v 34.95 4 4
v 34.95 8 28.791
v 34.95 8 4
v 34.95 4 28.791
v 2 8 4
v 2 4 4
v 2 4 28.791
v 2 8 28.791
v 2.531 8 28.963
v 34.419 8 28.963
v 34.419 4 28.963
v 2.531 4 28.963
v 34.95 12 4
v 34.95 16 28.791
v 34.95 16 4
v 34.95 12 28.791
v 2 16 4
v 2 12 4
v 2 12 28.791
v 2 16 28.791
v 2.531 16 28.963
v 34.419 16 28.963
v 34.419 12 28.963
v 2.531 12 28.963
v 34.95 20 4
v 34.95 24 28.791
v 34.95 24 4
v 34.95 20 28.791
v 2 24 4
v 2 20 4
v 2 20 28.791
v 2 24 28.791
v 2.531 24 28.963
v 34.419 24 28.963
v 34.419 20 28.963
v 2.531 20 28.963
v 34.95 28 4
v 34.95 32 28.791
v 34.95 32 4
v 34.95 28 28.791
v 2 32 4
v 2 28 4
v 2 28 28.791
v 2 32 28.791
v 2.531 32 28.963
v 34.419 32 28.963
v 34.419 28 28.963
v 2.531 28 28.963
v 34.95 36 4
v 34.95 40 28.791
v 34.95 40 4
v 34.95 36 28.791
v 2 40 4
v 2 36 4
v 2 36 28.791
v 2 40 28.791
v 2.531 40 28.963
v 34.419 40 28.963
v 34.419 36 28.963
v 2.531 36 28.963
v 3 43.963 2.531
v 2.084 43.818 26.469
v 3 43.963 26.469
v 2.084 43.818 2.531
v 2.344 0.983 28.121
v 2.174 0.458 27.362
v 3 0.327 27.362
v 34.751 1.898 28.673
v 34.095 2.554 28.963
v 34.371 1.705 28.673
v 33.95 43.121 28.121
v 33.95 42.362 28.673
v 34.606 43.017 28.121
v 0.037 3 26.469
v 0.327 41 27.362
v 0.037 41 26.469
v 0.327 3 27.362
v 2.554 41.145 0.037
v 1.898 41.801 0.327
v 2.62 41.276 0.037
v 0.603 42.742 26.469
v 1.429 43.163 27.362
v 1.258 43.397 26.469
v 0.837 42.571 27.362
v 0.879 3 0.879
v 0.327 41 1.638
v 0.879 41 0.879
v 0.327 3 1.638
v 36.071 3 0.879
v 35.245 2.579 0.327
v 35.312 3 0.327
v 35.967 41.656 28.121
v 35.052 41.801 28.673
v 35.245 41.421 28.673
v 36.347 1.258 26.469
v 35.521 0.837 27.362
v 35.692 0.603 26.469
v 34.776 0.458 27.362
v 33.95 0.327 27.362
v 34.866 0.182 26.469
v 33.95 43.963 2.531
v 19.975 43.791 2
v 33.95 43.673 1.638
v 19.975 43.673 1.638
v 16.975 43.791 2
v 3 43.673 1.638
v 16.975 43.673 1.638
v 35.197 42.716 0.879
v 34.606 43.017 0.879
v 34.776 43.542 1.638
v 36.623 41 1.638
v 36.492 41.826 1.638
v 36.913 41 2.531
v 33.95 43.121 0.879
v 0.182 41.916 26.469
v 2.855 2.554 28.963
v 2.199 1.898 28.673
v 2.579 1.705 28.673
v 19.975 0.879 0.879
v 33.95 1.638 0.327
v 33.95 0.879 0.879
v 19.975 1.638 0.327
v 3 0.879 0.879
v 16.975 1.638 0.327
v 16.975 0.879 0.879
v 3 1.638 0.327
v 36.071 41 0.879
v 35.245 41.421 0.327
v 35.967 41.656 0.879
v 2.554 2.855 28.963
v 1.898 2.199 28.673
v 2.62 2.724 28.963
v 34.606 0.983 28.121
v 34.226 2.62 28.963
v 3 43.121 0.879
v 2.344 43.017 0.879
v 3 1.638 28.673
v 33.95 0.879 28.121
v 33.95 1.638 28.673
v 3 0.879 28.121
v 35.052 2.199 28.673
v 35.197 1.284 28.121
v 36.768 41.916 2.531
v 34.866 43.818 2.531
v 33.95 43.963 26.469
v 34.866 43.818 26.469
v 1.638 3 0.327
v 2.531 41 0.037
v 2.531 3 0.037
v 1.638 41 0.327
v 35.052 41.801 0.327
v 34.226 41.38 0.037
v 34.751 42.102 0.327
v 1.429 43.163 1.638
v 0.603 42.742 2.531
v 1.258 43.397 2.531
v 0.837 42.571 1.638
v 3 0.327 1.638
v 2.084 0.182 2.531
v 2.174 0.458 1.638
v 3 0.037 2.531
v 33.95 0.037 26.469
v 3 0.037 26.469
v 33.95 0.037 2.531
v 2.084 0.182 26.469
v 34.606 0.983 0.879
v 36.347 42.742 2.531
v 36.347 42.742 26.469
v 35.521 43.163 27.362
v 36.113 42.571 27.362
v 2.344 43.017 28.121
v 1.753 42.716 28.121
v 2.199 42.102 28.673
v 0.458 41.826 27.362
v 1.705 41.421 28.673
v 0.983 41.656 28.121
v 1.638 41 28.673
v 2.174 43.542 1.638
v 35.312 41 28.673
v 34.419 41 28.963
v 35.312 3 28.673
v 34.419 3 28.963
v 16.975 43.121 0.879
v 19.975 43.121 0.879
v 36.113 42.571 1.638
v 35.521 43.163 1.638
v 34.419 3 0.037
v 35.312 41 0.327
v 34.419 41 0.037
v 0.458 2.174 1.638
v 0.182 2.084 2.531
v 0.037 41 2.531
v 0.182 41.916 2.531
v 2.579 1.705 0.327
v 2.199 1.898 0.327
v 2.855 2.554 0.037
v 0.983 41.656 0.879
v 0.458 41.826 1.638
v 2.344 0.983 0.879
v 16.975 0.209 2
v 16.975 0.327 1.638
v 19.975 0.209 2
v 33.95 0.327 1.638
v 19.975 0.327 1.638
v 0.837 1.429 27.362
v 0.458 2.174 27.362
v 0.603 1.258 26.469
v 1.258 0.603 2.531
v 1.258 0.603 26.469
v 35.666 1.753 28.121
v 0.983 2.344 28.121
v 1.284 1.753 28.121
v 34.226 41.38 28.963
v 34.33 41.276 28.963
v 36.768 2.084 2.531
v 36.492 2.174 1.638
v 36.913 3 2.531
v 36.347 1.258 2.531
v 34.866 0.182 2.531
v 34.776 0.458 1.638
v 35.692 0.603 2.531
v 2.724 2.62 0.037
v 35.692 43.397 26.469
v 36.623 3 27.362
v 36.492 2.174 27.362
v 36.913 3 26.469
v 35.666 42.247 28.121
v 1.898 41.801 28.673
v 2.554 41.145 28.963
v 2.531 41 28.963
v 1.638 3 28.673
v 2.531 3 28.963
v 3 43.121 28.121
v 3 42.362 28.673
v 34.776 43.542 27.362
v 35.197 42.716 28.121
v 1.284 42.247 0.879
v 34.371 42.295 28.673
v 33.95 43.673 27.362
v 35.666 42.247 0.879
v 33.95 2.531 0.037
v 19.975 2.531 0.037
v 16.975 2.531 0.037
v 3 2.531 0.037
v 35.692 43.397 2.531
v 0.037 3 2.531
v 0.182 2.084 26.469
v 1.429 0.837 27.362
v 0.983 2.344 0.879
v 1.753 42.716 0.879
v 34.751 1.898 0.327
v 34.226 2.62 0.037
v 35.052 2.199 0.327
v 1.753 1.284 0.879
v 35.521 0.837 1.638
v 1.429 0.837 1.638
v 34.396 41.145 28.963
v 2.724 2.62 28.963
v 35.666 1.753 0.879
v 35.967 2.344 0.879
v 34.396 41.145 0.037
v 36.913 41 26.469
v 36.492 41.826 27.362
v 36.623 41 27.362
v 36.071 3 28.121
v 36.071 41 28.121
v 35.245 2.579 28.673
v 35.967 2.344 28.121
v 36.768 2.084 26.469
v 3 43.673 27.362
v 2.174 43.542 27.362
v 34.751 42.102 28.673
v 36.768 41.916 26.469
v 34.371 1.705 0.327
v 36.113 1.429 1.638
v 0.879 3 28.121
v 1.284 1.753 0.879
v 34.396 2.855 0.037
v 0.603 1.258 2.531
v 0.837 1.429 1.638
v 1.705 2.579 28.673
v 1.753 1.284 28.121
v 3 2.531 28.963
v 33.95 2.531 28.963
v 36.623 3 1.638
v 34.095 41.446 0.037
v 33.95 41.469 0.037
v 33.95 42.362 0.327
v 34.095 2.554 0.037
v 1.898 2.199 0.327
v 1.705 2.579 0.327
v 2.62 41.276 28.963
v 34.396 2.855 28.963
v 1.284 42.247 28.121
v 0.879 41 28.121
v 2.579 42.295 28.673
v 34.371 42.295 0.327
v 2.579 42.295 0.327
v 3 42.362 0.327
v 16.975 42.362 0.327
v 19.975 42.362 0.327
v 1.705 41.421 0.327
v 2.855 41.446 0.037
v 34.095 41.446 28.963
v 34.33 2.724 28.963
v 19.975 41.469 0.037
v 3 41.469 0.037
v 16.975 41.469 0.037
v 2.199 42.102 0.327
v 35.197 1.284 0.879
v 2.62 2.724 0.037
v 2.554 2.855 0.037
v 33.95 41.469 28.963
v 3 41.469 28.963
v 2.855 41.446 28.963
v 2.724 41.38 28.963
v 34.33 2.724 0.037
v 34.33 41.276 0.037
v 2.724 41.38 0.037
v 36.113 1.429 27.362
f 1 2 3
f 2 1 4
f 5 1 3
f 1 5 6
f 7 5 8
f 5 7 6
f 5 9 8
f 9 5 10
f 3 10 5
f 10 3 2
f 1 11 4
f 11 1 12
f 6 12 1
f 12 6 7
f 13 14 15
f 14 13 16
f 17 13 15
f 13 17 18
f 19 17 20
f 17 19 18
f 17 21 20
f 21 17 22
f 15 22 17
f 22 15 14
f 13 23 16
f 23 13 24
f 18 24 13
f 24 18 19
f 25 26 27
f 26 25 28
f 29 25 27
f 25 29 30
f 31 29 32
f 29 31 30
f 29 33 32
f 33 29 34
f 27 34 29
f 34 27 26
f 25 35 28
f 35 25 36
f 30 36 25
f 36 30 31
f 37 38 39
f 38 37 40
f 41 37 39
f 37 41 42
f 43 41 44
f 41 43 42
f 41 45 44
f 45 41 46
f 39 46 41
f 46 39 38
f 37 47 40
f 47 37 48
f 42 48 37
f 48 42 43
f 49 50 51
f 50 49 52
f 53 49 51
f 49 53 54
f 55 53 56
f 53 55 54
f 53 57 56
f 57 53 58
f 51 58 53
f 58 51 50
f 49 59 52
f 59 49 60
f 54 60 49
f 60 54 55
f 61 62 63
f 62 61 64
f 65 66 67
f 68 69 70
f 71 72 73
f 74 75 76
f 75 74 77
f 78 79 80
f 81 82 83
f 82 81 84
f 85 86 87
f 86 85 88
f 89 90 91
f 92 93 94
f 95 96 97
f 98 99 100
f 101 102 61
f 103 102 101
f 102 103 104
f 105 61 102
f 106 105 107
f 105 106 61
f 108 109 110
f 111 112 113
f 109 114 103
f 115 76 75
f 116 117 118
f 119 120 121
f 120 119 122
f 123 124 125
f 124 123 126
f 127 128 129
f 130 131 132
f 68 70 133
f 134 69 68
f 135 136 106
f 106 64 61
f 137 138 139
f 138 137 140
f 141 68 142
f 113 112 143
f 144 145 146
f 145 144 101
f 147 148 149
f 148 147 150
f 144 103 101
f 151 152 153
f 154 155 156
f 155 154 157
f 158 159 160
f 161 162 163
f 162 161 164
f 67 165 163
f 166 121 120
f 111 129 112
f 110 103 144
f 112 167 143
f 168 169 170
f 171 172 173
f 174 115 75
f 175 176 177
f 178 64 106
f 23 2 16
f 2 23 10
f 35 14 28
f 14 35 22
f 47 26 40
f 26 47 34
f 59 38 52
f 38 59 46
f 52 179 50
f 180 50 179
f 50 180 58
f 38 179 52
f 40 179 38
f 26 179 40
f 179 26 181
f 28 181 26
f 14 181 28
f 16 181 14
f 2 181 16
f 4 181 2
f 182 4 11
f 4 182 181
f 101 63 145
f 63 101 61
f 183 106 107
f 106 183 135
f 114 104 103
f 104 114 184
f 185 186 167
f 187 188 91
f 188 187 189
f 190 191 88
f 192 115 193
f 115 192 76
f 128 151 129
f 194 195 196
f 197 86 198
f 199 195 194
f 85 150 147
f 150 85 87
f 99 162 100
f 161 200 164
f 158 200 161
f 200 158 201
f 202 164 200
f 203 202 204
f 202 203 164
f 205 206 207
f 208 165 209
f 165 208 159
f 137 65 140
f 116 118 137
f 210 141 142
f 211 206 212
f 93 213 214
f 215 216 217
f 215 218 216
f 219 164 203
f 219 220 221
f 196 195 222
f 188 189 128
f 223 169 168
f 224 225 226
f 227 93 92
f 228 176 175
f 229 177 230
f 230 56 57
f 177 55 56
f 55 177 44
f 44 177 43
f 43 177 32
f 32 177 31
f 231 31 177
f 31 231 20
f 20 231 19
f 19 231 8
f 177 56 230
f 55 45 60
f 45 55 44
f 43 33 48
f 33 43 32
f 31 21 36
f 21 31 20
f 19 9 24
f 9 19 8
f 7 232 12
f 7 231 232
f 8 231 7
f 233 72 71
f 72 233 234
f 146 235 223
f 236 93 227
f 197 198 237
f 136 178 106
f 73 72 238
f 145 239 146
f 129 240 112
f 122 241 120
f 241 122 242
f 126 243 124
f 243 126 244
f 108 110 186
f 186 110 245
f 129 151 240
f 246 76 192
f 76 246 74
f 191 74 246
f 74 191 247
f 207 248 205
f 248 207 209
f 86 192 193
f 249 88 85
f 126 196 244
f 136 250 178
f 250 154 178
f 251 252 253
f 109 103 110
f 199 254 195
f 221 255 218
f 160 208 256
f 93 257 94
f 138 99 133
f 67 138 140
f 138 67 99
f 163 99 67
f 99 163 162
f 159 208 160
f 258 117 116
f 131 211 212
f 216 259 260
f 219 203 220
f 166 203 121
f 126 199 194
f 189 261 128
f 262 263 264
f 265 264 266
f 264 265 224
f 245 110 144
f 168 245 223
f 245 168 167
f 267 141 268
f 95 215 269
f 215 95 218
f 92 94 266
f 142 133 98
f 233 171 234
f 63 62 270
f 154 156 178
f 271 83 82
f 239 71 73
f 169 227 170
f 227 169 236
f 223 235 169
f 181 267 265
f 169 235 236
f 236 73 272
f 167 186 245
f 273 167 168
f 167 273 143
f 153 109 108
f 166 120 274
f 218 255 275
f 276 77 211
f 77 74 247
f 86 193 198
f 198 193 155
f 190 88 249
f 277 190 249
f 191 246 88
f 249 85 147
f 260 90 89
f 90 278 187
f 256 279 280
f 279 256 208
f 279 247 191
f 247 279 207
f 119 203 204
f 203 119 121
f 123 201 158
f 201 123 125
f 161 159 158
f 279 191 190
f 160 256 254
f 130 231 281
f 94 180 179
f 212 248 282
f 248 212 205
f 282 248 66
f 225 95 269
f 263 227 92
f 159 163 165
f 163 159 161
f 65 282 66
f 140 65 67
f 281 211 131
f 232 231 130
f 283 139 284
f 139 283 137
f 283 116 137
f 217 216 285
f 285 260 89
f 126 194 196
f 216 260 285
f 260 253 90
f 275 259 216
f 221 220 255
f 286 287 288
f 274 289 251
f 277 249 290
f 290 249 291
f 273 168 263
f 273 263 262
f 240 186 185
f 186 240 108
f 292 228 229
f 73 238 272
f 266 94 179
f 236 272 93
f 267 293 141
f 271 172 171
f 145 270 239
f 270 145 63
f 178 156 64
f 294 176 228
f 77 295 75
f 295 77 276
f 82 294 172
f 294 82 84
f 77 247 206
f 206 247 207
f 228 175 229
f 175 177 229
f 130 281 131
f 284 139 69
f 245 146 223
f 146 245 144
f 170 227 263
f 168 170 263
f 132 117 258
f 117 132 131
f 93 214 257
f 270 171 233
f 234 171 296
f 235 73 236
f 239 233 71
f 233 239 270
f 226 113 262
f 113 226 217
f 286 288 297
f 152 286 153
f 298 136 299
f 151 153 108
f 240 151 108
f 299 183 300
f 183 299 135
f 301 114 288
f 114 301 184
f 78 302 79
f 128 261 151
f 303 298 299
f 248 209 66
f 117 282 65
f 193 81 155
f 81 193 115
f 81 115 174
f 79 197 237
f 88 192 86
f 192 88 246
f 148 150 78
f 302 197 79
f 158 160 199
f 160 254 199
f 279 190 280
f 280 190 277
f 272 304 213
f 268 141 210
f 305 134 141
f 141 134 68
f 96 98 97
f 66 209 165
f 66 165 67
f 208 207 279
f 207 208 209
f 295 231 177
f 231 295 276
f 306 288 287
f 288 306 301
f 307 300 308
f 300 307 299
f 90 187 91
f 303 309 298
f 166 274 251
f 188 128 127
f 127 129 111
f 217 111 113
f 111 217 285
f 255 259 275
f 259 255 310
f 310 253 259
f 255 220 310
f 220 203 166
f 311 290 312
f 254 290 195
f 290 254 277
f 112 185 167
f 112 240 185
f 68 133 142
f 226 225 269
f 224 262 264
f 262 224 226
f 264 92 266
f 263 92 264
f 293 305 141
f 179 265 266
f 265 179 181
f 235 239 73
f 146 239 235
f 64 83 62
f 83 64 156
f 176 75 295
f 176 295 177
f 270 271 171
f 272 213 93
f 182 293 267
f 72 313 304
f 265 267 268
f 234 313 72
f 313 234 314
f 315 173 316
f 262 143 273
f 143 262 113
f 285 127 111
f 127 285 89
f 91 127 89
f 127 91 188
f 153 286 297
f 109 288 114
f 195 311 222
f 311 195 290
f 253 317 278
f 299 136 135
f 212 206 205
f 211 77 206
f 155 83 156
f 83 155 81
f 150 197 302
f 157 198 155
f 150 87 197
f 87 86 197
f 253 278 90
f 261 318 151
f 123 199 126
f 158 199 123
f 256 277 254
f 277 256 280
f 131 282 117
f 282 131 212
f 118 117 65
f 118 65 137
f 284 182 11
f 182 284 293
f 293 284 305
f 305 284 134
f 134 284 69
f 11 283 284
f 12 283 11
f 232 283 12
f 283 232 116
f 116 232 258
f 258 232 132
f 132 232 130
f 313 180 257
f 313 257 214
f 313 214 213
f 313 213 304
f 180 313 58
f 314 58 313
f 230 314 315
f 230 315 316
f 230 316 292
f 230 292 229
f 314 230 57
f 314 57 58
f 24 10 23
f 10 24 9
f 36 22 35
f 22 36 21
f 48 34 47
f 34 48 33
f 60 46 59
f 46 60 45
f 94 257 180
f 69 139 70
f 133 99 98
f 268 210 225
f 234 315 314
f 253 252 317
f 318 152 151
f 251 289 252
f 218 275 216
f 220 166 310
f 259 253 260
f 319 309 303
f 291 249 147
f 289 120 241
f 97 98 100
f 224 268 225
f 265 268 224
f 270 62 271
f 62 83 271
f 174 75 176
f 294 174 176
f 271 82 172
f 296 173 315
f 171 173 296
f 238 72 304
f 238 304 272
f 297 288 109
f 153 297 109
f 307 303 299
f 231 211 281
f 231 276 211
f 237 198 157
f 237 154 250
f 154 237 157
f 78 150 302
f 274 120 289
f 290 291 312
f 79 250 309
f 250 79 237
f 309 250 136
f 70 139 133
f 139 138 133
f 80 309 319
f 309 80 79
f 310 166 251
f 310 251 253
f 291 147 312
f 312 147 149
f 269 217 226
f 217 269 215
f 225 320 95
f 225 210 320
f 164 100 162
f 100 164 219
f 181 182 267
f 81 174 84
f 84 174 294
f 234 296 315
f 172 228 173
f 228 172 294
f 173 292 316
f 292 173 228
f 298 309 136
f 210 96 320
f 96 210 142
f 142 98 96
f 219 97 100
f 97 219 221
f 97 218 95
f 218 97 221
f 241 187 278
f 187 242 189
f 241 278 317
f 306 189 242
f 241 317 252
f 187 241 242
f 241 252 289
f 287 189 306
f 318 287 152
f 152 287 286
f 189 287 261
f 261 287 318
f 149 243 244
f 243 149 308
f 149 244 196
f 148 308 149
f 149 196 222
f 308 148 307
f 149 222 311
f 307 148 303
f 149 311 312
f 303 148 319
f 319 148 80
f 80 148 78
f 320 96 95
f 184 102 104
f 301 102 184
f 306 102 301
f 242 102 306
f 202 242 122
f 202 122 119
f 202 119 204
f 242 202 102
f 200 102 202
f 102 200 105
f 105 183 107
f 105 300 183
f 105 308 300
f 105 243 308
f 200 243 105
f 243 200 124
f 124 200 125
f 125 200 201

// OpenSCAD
// [FL_INDEX: keywords="openscad, 3d_parametric, Nintendo_DS_Game_Card_Box, csg_solid" | COT="Parametric OpenSCAD design from 3DCodeverse"]
// Title: Nintendo DS Game Card Box

//Constants
stuffz = 2/1;
fuzz = 0.2/1;
real_card_length = 34.95/1;
real_card_width = 32.75/1;
real_card_thick = 3.8/1;
card_length = real_card_length + fuzz;
card_width = real_card_width + fuzz;
card_thick = real_card_thick + fuzz;

//DS Box
box_height_addition = 25; //[10: 32]
gutter_height = 2; //[1:5]
gutter_width = 3; //[1:5]
number_of_cards = 5; //[1:20]
card_spacing = 4; //[2:7]
$fn = 20;
cube_r = 3; //[1 : 5]

box(number_of_cards);

module card(){
  cube([card_width,card_thick,card_length]);
}

module box(number){
  box_x = card_width + stuffz*2;
  box_y = card_spacing + (card_thick + card_spacing) * number;
  box_z = gutter_height+ stuffz + box_height_addition;
  card_x_trans = box_x / 2 - card_width /2;
  //%cube([box_x, box_y, box_z]);
  difference(){
    roundCornerCube(box_x,box_y,box_z,cube_r);
    //gutter
    translate([(box_x/2) - (gutter_width/2),-fuzz,-fuzz]) 
    cube([gutter_width, box_y + (fuzz*2),gutter_height+fuzz]);
    //cards
    for (i = [0 : number-1]){
      #translate([card_x_trans, card_spacing + (card_thick + card_spacing)*i,gutter_height+stuffz]) card();
    }
  }
}

module roundCornerCube(x,y,z,r_sphere){
r = r_sphere;
if (x < r) {echo ("roundCornerCube: error: x < r !!");}
if (y < r) {echo ("roundCornerCube: error: y < r !!");}
if (z < r) {echo ("roundCornerCube: error: z < r !!");}
	hull(){
		translate([r,y-r,z-r]) sphere(r_sphere); //1!
		translate([x-r,y-r,z-r]) sphere(r_sphere); //2
		translate([r,r,z-r]) sphere(r_sphere); //3
		translate([x-r,r,z-r]) sphere(r_sphere); //4
		translate([r,y-r,r]) sphere(r_sphere); //5!
		translate([x-r,y-r,r]) sphere(r_sphere); //6		
		translate([r,r,r]) sphere(r_sphere); //7
		translate([x-r,r,r]) sphere(r_sphere); //8
	}
}
